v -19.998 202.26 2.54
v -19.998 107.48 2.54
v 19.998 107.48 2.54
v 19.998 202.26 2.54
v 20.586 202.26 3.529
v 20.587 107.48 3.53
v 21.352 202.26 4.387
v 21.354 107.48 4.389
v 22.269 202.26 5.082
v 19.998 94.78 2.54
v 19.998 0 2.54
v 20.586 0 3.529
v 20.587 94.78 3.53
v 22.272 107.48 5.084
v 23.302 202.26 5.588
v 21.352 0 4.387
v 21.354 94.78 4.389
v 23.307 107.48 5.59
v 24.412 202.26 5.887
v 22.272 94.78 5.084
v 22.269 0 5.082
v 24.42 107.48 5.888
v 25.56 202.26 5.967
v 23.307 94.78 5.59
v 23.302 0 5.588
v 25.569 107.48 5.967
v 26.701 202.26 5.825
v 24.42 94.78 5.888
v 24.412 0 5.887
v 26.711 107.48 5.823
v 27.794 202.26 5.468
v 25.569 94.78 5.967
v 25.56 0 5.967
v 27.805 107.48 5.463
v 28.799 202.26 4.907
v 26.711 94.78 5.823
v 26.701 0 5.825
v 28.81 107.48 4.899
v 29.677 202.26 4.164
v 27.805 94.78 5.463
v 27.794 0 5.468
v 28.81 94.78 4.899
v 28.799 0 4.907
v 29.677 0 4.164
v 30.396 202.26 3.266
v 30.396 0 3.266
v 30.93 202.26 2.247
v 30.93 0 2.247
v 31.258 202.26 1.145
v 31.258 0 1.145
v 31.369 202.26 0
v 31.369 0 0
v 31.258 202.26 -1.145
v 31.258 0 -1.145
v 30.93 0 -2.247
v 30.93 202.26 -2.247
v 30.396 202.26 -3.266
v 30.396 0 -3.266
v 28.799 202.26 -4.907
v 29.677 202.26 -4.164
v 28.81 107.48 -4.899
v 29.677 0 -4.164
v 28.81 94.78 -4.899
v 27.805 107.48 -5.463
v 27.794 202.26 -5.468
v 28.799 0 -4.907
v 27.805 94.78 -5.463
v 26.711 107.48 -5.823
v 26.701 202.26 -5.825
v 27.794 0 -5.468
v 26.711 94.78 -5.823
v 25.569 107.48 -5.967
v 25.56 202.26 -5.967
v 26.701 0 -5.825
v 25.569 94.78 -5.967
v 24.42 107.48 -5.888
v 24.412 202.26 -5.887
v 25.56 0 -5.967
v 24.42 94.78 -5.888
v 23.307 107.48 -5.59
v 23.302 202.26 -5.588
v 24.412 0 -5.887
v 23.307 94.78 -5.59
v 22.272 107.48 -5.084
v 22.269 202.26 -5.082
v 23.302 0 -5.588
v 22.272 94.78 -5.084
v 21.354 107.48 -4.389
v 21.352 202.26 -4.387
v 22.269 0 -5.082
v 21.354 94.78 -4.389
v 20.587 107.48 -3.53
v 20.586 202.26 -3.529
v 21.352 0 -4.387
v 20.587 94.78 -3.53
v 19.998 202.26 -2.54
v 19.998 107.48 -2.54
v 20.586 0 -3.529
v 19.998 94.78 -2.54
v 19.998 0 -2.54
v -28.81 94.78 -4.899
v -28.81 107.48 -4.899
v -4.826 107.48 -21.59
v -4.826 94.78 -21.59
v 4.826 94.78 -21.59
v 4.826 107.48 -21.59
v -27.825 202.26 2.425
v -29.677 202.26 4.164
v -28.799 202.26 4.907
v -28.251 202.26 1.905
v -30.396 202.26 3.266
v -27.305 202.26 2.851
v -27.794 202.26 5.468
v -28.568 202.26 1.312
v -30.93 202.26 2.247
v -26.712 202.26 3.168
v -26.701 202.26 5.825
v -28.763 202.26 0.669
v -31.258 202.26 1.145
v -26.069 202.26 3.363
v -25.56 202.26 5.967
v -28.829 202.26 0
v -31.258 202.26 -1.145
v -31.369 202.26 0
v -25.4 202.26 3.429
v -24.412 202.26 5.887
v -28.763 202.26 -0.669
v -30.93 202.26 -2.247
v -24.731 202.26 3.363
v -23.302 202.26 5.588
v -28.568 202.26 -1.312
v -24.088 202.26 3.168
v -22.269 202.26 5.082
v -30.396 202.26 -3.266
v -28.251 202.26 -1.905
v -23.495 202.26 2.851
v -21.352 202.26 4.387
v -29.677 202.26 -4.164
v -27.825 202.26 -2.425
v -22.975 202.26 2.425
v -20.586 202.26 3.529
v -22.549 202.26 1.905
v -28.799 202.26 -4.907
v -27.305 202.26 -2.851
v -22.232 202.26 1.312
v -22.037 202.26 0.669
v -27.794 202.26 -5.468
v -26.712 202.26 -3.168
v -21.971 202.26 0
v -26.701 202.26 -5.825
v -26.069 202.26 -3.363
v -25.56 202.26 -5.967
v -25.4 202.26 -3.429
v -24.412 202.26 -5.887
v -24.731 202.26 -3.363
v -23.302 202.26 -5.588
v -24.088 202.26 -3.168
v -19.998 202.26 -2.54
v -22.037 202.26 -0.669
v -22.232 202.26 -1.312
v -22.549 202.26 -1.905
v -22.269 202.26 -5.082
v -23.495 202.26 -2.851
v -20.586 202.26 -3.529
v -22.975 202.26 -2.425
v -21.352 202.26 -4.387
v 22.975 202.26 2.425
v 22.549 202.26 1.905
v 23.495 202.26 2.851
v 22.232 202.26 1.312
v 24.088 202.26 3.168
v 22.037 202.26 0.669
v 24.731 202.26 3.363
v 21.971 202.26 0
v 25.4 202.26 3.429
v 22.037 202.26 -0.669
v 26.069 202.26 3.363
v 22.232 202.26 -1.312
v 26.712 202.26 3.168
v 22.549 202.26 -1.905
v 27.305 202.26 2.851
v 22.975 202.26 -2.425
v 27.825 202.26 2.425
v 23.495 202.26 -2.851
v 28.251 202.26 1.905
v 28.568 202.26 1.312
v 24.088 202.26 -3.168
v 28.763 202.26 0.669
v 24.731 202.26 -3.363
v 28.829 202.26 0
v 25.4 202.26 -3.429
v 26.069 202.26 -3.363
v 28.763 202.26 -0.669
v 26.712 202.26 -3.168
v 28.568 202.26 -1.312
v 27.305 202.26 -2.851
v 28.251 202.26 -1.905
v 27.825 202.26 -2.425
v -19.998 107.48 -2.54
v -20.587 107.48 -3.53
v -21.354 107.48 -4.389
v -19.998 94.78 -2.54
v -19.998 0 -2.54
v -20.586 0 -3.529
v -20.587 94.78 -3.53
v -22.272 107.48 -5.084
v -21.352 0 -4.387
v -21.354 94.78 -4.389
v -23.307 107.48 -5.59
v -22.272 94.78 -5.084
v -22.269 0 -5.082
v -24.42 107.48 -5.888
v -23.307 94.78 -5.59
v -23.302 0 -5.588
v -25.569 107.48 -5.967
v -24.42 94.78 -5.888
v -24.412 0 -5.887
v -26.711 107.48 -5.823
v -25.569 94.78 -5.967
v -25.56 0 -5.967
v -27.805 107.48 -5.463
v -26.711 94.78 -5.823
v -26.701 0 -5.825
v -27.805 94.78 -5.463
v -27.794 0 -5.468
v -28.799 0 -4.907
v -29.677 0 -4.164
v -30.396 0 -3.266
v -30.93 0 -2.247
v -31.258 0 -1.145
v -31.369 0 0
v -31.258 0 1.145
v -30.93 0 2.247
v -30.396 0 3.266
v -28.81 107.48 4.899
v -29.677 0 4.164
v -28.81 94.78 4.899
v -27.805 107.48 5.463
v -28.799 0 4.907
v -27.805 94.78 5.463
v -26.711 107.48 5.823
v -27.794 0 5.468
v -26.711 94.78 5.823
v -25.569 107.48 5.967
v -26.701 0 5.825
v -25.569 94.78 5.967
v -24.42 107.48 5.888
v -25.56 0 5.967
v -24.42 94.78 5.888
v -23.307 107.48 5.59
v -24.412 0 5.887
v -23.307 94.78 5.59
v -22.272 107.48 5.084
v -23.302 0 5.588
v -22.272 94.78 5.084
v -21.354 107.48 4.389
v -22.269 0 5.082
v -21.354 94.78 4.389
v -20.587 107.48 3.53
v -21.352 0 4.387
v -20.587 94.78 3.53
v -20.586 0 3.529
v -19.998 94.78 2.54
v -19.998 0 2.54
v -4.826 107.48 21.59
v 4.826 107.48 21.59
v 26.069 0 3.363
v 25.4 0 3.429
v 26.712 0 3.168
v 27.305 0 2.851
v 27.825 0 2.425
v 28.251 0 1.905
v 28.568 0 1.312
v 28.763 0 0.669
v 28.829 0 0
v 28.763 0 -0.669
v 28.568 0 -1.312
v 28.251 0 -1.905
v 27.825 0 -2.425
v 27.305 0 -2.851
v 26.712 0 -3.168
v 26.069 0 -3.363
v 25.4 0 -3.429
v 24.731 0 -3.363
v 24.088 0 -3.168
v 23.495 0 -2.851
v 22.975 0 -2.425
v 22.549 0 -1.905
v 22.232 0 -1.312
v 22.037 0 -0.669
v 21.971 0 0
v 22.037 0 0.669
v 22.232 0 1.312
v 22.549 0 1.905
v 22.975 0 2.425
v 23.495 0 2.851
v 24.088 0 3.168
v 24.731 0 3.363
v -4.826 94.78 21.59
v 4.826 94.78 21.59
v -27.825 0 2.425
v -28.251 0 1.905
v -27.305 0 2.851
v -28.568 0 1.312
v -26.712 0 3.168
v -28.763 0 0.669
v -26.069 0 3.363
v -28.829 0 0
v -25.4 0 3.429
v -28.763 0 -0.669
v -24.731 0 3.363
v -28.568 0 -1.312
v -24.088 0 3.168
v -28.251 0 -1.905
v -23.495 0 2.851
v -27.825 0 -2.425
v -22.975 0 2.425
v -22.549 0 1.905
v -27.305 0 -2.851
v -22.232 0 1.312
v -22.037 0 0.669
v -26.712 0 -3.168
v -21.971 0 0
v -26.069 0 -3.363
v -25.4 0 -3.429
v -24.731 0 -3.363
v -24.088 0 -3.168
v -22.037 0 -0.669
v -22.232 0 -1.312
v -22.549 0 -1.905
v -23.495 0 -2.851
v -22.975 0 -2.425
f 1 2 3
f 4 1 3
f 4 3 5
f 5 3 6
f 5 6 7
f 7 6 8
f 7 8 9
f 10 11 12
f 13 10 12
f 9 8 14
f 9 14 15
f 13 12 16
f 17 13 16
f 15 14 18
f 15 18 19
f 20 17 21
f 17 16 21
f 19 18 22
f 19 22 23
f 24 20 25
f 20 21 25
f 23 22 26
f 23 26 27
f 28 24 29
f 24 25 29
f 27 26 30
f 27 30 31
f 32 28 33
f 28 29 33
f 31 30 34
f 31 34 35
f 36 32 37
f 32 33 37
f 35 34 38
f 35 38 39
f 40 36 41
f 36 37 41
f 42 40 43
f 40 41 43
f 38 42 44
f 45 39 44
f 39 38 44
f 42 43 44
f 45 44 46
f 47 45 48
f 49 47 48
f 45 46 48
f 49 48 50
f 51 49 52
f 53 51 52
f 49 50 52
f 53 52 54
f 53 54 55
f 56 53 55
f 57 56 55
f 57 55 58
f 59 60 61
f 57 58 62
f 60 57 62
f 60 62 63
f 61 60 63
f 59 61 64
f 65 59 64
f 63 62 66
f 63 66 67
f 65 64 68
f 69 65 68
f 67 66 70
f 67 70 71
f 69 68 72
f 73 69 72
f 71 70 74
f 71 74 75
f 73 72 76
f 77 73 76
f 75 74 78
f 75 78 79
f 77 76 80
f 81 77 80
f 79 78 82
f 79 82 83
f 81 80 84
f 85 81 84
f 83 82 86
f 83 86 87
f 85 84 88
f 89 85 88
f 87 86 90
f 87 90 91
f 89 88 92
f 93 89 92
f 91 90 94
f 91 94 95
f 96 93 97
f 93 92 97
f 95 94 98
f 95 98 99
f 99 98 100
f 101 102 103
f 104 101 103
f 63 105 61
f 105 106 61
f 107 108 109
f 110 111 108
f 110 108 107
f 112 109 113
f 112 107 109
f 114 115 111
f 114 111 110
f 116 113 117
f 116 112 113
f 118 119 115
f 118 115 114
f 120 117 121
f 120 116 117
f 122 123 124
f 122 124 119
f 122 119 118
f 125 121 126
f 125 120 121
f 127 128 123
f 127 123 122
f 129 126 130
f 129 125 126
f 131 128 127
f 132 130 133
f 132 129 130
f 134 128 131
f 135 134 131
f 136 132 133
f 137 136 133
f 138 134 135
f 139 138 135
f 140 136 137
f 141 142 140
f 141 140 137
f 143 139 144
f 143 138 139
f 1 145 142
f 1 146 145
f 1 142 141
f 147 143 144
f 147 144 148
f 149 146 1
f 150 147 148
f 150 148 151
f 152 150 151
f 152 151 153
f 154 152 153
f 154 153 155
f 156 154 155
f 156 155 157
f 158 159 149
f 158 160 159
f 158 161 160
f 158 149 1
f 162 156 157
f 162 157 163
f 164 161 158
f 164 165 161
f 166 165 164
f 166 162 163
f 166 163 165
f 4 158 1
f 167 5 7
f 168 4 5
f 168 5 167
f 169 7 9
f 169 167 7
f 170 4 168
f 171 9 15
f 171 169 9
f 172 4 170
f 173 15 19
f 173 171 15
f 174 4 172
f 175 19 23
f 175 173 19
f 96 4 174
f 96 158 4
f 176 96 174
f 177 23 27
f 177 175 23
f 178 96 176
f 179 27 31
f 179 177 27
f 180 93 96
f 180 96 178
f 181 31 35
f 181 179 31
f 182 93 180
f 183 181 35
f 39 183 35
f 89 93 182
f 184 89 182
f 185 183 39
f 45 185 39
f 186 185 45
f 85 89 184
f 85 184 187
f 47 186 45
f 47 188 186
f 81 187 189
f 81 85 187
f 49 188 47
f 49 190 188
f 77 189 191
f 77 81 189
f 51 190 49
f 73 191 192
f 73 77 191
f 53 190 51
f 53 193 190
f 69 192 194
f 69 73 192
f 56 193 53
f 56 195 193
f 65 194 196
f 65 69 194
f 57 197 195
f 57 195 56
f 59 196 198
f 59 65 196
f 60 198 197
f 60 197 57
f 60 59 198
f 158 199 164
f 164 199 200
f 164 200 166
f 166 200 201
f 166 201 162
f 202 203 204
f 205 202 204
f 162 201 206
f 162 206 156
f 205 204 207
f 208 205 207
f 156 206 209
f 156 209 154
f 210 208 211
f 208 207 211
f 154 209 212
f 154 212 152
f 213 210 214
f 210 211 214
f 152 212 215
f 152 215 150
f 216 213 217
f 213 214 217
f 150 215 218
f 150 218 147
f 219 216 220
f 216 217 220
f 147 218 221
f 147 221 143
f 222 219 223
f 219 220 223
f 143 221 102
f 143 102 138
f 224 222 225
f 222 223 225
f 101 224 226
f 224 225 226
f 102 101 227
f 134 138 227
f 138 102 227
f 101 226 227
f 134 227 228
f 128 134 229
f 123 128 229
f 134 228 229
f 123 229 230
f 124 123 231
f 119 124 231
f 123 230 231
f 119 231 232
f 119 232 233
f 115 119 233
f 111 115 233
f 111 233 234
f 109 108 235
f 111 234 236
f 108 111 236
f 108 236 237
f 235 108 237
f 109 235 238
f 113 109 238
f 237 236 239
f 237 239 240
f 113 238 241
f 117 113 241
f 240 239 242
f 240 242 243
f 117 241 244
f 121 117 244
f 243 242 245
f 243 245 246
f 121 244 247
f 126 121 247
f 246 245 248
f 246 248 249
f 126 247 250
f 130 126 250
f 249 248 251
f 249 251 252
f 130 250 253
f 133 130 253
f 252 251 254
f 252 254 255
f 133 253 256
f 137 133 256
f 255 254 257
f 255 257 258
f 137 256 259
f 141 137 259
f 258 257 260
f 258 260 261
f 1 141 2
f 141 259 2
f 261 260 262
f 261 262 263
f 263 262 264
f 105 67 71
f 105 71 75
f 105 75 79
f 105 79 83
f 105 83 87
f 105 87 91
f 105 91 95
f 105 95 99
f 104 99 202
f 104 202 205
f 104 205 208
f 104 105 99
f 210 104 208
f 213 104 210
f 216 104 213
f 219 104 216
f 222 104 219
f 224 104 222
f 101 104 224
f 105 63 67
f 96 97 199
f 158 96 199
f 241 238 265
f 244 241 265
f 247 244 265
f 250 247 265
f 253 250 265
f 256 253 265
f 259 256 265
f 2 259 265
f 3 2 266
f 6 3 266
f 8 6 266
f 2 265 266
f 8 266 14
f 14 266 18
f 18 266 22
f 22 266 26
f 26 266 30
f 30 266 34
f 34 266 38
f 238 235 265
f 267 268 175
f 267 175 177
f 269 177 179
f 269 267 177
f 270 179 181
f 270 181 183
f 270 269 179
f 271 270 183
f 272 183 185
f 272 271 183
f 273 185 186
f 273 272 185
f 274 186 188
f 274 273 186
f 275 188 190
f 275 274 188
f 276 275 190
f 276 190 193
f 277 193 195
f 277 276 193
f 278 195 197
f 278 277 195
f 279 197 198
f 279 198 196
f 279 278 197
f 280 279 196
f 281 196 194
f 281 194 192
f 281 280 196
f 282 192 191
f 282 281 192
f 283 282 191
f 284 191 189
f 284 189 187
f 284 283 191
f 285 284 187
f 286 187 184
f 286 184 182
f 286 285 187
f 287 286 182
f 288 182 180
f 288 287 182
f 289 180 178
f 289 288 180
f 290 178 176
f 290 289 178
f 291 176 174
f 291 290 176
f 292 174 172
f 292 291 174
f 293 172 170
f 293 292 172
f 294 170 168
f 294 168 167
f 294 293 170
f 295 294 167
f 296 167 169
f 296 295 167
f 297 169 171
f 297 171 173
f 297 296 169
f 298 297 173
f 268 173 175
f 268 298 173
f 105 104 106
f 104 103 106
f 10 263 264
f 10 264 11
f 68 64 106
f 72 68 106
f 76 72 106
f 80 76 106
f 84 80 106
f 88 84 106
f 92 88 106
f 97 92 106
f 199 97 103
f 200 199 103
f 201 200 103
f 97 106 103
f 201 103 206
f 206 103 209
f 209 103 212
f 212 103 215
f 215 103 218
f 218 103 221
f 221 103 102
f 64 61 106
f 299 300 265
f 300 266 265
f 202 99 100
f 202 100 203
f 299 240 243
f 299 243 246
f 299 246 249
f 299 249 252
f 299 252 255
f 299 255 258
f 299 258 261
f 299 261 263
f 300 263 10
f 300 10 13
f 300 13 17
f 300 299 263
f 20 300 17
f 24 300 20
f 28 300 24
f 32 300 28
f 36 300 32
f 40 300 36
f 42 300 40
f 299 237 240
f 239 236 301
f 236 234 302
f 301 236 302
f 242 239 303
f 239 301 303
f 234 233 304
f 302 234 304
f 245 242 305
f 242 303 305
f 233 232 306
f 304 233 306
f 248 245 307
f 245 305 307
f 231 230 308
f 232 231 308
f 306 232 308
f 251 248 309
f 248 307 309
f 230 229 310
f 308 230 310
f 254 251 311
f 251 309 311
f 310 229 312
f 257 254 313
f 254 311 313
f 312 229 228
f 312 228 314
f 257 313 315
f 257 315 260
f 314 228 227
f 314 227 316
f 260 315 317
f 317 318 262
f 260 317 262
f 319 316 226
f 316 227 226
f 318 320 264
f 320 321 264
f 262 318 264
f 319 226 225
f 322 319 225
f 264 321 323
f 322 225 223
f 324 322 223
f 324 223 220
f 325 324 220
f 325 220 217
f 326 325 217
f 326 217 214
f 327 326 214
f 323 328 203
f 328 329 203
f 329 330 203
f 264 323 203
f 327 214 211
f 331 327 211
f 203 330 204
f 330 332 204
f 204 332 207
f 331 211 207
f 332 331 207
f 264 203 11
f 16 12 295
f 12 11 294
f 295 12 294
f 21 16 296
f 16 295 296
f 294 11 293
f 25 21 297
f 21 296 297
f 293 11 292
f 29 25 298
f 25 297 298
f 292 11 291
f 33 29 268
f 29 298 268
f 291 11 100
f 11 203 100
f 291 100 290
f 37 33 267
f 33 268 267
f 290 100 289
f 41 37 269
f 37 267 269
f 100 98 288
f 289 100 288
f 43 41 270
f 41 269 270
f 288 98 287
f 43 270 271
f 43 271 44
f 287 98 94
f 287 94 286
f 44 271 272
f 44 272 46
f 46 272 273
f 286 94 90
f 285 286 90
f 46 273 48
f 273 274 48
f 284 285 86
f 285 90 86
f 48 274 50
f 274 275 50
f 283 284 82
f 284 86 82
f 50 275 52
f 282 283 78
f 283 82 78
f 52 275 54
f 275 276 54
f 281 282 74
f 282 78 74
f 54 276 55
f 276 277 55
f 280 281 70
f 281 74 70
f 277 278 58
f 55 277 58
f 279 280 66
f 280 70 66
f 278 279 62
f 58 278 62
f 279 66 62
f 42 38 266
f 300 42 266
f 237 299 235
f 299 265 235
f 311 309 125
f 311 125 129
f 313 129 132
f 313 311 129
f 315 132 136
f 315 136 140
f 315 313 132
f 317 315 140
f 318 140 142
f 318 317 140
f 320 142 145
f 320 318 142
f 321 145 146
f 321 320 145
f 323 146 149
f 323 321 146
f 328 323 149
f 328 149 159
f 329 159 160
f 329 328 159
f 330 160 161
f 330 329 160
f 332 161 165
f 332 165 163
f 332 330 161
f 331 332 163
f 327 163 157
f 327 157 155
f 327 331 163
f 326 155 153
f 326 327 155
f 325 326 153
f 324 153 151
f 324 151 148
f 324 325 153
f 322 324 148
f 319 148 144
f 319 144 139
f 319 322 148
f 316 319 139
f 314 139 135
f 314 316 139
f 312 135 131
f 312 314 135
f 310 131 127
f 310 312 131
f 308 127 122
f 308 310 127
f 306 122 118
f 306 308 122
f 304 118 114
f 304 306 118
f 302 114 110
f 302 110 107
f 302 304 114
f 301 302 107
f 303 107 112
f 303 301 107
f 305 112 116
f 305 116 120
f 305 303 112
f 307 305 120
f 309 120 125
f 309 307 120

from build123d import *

# Parameters (mm, degrees)
SKETCH1_R           = 3.429
BOSS_EXTRUDE1_DEPTH = 202.2602
BOSS_EXTRUDE2_DEPTH = 6.35
CIRPATTERN1_COUNT   = 2


with BuildPart() as part:
    # Sketch1 → Boss-Extrude1 (new body)
    with BuildSketch(Plane(origin=(0, 0, 0), x_dir=(1, 0, 0), z_dir=(0, 1, 0))):
        with BuildLine():
            Line((19.998392739, 2.54), (-19.998392739, 2.54))
            ThreePointArc((-19.998392739, 2.54), (-31.369, 0), (-19.998392739, -2.54))
            Line((-19.998392739, -2.54), (19.998392739, -2.54))
            ThreePointArc((19.998392739, -2.54), (31.369, 0), (19.998392739, 2.54))
        make_face()
        with Locations((-25.4, 0)):
            Circle(SKETCH1_R, mode=Mode.SUBTRACT)
        with Locations((25.4, 0)):
            Circle(SKETCH1_R, mode=Mode.SUBTRACT)
    extrude(amount=BOSS_EXTRUDE1_DEPTH)

    # Sketch3 → Boss-Extrude2 (add, symmetric)
    with BuildSketch(Plane(origin=(0, 101.1301, 0), x_dir=(1, 0, 0), z_dir=(0, 1, 0))):
        with BuildLine():
            Line((-28.809566389, 4.899369147), (-4.826, 21.59))
            Line((-4.826, 21.59), (4.826, 21.59))
            Line((4.826, 21.59), (28.809566389, 4.899369147))
            ThreePointArc((28.809566389, 4.899369147), (23.85607241, 5.765869284), (19.998392739, 2.54))
            Line((19.998392739, 2.54), (-19.998392739, 2.54))
            ThreePointArc((-19.998392739, 2.54), (-23.85607241, 5.765869284), (-28.809566389, 4.899369147))
        make_face()
    boss_extrude2 = extrude(amount=BOSS_EXTRUDE2_DEPTH, both=True)

    # CirPattern1: Boss-Extrude2 ×2 about axis
    cirpattern1_axis = Axis((0, -10.11301, 0), (0, 1, 0))
    for i in range(1, CIRPATTERN1_COUNT):
        add(boss_extrude2.rotate(cirpattern1_axis, i * 360 / CIRPATTERN1_COUNT))


solid = part.part
